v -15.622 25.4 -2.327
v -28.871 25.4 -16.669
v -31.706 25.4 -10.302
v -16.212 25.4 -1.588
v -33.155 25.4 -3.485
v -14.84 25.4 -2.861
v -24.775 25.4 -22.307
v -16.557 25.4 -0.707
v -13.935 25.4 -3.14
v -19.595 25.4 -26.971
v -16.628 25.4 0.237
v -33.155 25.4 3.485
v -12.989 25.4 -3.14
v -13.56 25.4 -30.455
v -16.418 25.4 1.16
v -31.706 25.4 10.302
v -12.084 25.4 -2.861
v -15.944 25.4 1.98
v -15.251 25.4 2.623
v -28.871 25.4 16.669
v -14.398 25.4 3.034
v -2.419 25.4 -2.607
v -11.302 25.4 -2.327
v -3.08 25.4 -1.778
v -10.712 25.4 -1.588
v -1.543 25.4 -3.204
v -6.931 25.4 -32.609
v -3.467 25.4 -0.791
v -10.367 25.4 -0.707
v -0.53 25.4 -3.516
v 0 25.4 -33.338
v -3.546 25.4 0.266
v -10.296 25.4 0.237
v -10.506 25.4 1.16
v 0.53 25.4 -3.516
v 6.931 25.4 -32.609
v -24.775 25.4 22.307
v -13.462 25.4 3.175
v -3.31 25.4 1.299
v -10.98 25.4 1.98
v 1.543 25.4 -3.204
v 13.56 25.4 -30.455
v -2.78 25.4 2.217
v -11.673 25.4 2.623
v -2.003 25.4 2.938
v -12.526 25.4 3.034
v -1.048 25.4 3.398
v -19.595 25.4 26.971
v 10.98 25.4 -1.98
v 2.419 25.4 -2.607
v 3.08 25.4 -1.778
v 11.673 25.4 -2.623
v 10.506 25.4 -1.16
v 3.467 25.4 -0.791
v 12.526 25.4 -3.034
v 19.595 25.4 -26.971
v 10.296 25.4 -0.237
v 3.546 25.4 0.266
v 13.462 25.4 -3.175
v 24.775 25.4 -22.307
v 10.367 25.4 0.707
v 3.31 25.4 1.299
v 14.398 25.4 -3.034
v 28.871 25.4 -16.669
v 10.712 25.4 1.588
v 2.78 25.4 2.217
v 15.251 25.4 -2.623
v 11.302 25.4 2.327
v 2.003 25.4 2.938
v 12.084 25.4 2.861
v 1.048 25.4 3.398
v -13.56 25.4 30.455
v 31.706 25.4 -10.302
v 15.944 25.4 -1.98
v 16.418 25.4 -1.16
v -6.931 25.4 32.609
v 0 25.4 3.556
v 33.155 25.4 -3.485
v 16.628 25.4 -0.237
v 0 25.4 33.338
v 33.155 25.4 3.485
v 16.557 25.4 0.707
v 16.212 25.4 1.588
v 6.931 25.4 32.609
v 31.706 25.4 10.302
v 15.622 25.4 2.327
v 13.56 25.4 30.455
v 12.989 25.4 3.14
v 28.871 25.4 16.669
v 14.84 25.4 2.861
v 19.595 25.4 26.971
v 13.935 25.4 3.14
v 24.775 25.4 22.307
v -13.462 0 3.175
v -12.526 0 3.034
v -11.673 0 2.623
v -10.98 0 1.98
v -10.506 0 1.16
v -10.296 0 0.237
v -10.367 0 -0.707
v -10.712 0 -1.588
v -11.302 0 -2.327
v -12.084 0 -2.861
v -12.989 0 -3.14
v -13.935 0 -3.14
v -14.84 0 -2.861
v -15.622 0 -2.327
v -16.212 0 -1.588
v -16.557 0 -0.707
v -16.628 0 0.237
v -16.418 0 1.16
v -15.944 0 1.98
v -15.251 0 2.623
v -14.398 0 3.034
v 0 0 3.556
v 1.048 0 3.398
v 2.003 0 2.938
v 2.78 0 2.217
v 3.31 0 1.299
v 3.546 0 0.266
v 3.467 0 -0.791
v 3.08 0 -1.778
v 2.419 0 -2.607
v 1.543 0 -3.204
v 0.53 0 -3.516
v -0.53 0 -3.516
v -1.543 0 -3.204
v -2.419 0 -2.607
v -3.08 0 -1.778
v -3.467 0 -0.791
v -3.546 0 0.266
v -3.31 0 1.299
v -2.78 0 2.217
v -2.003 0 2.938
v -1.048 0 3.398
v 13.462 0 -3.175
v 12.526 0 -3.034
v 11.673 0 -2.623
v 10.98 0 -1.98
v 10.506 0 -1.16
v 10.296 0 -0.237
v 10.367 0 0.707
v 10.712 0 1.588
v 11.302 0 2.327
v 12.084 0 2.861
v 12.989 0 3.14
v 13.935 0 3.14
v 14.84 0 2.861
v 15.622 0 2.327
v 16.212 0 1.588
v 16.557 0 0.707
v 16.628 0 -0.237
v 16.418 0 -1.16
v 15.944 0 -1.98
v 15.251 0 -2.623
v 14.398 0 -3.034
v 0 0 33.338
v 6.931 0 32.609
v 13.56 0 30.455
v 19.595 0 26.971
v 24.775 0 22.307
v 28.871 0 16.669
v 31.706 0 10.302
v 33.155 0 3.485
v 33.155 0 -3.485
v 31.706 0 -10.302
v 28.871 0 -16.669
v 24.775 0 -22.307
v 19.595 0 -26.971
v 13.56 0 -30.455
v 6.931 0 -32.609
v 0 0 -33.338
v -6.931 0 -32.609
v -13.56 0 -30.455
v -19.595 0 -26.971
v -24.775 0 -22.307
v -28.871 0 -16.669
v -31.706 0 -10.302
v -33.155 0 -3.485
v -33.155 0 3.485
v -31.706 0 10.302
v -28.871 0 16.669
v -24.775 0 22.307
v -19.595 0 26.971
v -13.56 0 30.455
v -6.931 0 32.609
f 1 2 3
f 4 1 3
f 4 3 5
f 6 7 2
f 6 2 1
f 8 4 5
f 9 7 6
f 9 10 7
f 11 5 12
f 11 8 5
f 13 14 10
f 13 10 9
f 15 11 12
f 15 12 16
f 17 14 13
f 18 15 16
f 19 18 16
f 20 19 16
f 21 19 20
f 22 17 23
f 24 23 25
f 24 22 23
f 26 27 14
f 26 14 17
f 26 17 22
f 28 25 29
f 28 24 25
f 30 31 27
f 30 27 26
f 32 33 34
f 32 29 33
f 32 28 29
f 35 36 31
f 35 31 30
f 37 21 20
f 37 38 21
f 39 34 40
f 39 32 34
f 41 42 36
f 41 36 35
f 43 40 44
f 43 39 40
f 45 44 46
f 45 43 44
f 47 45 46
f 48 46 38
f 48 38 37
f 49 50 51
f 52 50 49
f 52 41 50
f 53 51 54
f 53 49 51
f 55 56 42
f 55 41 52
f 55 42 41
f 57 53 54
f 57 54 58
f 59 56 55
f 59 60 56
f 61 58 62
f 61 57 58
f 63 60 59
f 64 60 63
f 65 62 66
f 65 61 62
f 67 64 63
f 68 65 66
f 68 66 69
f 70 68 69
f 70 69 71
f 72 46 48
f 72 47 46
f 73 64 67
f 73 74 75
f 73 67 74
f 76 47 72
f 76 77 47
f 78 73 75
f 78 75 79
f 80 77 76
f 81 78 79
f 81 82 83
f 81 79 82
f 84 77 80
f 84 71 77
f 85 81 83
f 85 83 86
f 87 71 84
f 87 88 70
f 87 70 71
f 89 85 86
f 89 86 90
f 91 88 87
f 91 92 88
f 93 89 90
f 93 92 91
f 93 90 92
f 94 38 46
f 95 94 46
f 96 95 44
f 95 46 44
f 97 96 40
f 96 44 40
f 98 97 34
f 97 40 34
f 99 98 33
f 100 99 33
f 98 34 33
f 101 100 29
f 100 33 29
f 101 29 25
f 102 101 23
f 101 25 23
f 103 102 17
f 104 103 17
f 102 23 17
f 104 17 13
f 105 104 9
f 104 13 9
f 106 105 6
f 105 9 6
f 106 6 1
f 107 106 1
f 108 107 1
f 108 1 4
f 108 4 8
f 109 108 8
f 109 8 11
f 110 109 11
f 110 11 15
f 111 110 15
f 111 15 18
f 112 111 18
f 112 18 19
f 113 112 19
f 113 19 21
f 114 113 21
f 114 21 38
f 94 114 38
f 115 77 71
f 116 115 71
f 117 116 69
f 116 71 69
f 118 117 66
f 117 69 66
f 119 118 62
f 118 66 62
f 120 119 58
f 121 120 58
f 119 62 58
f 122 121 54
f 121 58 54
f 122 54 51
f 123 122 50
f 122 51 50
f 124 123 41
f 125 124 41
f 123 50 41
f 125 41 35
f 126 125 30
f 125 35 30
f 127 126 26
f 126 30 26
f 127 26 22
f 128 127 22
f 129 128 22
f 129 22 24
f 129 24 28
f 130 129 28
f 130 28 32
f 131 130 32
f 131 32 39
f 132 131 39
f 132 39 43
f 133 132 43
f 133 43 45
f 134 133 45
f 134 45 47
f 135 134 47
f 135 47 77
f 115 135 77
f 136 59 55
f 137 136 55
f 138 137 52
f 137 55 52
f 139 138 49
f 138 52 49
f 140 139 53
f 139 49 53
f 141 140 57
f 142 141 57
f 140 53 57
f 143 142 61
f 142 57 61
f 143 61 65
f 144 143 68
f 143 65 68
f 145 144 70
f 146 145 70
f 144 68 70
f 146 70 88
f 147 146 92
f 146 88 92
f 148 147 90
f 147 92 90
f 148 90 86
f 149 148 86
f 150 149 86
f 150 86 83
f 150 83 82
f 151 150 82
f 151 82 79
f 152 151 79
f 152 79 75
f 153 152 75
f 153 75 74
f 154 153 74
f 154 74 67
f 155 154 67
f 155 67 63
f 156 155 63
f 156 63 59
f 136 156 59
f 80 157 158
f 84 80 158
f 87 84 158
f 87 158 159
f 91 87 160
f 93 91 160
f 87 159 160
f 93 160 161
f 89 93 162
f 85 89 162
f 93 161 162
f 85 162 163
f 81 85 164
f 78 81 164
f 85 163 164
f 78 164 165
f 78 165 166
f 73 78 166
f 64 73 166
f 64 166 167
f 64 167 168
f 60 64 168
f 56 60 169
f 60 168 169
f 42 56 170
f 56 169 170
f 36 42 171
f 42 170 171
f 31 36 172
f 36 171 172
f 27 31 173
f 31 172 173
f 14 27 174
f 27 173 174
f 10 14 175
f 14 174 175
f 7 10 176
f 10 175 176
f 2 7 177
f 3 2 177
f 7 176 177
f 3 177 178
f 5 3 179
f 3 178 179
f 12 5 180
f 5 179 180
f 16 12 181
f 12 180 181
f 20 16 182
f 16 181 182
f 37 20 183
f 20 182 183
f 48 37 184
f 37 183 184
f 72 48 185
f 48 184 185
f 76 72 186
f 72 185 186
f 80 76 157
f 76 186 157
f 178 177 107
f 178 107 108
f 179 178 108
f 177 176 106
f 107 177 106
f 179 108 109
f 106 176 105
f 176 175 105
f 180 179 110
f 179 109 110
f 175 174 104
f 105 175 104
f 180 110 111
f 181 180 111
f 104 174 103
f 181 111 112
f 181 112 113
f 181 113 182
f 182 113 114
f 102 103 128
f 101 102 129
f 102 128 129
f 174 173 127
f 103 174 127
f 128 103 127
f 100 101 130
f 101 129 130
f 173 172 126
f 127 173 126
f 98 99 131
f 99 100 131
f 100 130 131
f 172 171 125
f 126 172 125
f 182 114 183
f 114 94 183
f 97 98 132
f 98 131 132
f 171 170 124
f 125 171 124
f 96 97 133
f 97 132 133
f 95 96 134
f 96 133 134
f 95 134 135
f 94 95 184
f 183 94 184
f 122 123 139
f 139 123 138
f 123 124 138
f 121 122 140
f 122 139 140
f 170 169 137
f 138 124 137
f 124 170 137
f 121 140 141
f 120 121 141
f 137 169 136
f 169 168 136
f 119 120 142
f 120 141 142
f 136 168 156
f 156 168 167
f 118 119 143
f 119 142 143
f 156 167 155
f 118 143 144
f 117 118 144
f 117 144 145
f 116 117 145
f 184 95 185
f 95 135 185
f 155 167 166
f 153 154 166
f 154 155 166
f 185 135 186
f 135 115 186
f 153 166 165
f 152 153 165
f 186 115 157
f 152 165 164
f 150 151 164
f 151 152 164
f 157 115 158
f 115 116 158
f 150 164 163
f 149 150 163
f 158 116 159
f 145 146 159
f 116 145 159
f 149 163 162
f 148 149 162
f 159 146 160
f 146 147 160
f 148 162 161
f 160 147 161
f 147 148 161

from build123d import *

# Parameters (mm, degrees)
SKETCH1_R           = 33.3375
BOSS_EXTRUDE1_DEPTH = 25.4
SKETCH2_R           = 3.556
CUT_EXTRUDE1_DEPTH  = 54.553130744
SKETCH3_R           = 3.175
CUT_EXTRUDE2_DEPTH  = 54.553130744


with BuildPart() as part:
    # Sketch1 → Boss-Extrude1 (new body)
    with BuildSketch(Plane(origin=(0, 0, 0), x_dir=(1, 0, 0), z_dir=(0, 1, 0))):
        with Locations(Location((0, 0, 0), (0, 0, 270))):
            Circle(SKETCH1_R)
    extrude(amount=BOSS_EXTRUDE1_DEPTH)

    # Sketch2 → Cut-Extrude1 (cut, through all)
    with BuildSketch(Plane(origin=(0, 25.4, 0), x_dir=(1, 0, 0), z_dir=(0, 1, 0))):
        with Locations(Location((0, 0, 0), (0, 0, 270))):
            Circle(SKETCH2_R)
    extrude(amount=-CUT_EXTRUDE1_DEPTH, mode=Mode.SUBTRACT)

    # Sketch3 → Cut-Extrude2 (cut, through all)
    with BuildSketch(Plane(origin=(0, 25.4, 0), x_dir=(-1, 0, 0), z_dir=(0, 1, 0))):
        with Locations(Location((13.462, 0, 0), (0, 0, 90))):
            Circle(SKETCH3_R)
        with Locations(Location((-13.462, 0, 0), (0, 0, 270))):
            Circle(SKETCH3_R)
    extrude(amount=-CUT_EXTRUDE2_DEPTH, mode=Mode.SUBTRACT)


solid = part.part
